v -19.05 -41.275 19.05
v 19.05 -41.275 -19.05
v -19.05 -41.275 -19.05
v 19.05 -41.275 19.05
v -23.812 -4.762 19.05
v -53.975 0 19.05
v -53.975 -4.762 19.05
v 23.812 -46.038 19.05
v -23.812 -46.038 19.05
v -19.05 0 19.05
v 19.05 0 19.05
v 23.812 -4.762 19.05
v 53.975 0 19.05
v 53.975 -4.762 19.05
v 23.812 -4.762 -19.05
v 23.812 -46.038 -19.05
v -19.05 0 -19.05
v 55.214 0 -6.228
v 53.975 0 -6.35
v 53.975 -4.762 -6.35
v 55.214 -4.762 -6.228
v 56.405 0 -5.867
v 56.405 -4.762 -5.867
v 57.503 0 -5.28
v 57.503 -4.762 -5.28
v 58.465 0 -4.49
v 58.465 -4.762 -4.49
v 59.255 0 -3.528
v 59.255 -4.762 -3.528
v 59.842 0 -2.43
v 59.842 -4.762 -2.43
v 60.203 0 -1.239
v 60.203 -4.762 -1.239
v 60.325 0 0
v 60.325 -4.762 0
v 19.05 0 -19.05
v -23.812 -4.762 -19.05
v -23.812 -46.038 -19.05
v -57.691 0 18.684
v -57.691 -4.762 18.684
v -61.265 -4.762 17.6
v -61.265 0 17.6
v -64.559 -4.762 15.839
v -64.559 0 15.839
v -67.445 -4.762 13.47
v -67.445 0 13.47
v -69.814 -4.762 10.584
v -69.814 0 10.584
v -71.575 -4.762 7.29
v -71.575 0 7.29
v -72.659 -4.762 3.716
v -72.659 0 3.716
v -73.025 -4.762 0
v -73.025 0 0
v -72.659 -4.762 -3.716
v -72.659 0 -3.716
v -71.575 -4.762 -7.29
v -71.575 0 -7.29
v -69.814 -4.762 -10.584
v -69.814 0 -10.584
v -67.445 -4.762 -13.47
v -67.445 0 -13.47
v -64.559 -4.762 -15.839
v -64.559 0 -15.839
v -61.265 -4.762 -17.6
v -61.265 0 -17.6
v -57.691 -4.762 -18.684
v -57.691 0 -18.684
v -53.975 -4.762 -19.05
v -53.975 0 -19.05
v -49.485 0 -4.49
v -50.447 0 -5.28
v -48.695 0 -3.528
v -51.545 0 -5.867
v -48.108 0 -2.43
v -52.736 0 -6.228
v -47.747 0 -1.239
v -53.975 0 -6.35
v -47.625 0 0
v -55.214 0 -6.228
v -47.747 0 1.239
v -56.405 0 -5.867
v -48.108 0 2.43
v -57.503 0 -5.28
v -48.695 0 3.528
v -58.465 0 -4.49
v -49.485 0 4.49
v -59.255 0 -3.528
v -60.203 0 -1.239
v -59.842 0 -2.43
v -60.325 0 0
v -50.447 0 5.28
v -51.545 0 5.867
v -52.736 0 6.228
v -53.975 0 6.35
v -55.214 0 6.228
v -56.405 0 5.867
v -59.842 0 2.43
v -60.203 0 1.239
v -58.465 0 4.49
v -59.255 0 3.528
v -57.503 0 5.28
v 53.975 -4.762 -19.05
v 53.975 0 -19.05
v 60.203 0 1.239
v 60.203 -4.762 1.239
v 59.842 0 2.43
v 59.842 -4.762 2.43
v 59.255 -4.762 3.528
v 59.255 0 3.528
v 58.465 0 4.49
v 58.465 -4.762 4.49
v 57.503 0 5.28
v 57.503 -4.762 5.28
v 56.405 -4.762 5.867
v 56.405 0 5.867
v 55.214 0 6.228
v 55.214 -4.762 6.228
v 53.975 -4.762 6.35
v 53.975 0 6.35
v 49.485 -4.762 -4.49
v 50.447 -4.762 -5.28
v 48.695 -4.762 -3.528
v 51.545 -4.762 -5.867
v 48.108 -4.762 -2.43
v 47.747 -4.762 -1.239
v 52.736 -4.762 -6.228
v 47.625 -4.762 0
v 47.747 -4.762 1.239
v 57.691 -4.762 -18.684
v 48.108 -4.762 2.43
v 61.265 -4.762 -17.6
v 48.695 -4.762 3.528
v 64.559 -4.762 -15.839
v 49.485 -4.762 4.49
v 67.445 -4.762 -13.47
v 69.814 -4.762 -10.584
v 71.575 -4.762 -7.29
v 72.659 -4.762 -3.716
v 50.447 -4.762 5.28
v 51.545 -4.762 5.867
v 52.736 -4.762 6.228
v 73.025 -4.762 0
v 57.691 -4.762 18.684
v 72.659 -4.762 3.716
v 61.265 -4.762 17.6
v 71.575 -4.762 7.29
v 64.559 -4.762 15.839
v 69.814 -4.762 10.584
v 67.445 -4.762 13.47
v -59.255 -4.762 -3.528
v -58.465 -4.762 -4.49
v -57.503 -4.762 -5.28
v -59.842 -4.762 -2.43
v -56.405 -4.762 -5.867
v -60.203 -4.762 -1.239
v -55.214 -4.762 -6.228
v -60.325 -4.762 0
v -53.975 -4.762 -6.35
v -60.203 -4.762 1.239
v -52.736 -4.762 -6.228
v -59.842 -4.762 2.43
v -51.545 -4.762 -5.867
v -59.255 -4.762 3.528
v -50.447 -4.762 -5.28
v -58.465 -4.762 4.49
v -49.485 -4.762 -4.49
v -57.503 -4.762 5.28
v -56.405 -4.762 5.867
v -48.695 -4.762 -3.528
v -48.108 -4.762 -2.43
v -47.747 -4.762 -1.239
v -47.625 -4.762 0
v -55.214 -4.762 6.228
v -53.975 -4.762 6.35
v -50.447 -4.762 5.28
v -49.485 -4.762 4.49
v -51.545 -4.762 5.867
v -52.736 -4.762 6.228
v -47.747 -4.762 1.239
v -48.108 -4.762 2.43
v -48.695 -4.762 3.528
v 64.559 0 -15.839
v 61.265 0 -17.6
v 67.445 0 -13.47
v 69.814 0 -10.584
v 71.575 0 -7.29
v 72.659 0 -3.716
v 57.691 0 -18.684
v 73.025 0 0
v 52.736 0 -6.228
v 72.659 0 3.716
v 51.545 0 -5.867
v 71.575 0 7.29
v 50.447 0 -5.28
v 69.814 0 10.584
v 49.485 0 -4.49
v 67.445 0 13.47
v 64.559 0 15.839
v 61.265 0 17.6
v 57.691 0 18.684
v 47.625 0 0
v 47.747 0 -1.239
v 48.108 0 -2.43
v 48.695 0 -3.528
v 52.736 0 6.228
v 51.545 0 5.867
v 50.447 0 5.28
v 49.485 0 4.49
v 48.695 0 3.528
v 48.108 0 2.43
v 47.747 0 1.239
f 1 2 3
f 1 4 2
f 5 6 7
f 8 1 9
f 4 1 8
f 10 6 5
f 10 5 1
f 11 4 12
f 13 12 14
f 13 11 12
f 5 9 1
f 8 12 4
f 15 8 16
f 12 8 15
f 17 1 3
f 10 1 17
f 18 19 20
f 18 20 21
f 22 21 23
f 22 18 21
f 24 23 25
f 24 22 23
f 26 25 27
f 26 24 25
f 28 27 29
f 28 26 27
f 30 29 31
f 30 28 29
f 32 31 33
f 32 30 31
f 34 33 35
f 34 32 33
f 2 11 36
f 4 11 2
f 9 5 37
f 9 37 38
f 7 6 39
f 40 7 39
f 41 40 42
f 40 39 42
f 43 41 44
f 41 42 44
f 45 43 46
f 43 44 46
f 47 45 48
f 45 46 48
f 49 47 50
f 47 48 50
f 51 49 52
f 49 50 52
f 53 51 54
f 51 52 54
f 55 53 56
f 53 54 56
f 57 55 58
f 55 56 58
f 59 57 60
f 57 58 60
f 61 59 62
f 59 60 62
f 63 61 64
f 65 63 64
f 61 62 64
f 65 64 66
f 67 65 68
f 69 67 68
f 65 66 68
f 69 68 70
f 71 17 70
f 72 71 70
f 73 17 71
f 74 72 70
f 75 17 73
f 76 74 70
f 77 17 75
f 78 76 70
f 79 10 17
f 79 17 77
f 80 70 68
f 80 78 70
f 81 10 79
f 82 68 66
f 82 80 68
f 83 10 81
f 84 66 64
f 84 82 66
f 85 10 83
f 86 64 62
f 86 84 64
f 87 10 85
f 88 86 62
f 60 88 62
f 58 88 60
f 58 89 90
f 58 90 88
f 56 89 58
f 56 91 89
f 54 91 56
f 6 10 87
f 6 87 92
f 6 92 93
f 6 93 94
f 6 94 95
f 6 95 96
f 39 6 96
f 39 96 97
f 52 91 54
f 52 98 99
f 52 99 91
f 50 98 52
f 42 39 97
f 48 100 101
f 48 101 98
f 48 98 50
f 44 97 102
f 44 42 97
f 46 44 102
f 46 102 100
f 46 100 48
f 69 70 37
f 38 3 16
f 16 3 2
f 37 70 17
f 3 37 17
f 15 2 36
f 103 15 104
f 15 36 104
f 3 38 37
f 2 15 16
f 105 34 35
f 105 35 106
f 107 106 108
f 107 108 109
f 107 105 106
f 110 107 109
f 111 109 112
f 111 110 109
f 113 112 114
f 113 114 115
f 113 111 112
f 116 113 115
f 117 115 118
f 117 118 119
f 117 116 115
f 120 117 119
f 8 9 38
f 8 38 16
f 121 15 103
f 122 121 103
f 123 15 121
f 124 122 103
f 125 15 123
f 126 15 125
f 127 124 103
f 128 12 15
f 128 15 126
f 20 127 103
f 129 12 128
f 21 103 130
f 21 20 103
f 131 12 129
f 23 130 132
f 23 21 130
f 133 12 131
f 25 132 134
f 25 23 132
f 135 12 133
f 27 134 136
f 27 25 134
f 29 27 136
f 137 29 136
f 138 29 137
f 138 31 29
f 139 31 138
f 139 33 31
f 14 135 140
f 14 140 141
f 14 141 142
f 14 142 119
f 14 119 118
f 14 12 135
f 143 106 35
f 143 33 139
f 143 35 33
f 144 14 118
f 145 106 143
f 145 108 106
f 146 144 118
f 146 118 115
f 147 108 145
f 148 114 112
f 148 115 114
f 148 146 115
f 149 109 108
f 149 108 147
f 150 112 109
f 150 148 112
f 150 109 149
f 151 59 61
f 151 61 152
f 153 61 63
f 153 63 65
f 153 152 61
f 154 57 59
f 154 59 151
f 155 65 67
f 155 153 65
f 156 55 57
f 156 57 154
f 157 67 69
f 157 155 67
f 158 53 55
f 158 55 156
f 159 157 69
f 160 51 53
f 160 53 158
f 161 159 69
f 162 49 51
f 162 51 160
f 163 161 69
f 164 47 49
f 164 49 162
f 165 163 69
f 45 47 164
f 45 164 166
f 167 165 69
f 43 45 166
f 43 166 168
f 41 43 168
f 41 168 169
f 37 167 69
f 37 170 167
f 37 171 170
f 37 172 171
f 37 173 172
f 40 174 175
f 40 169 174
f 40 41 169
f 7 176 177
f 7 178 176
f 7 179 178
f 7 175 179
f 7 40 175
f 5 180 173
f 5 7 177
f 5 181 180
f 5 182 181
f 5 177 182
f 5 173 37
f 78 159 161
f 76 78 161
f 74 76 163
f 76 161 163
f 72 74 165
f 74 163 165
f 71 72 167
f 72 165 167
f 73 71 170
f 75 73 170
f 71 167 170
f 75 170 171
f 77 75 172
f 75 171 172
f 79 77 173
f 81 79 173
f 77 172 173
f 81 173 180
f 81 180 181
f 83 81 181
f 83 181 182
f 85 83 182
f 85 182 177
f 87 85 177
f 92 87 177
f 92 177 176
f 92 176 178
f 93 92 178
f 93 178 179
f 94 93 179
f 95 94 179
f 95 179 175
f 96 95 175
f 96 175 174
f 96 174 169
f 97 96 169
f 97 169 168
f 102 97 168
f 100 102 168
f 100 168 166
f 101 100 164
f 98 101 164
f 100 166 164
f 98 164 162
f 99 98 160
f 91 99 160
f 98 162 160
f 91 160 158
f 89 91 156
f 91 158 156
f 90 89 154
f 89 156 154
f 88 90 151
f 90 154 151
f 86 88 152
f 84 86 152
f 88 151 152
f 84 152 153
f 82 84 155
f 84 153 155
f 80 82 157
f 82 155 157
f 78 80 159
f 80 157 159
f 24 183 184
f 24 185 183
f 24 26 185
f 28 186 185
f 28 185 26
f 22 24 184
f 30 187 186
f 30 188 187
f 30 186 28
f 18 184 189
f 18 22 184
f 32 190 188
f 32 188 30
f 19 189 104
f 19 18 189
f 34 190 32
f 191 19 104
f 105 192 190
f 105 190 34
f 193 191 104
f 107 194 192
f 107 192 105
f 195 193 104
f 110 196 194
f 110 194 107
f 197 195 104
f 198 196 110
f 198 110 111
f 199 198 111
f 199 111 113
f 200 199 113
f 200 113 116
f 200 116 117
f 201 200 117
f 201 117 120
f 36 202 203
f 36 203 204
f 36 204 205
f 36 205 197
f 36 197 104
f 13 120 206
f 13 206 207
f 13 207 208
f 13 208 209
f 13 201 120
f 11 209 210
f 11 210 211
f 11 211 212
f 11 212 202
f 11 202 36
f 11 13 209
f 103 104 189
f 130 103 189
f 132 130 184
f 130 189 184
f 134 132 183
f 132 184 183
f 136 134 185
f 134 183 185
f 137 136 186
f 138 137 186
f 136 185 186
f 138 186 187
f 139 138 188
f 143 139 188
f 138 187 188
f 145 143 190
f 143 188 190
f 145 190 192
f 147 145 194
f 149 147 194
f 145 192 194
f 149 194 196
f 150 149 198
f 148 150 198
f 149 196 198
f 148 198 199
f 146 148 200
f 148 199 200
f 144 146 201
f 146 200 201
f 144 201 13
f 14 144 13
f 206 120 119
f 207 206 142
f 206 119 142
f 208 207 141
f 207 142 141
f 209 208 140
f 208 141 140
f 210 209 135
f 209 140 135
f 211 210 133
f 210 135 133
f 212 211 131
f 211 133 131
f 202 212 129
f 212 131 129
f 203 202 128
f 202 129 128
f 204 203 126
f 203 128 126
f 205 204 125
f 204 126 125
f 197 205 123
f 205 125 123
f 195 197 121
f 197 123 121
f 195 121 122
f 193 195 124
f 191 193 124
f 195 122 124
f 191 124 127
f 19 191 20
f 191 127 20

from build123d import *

# Parameters (mm, degrees)
F1_DEPTH      = 19.05
F1_DEPTH_BACK = 19.05
F3_D          = 12.7
F2_R          = 19.05
F2_R_2        = 6.35
F4_DEPTH      = 4.7625


with BuildPart() as f1:
    # F0 (on Top) → F1 (new body, two sides)
    with BuildSketch(Plane.XY) as f1_sk:
        Polygon((-19.05, -41.275), (-19.05, 0), (-53.975, 0), (-53.975, -4.7625), (-23.8125, -4.7625), (-23.8125, -46.0375), (23.8125, -46.0375), (23.8125, -4.7625), (53.975, -4.7625), (53.975, 0), (19.05, 0), (19.05, -41.275), align=None)
    extrude(amount=F1_DEPTH)
    extrude(f1_sk.sketch, amount=-F1_DEPTH_BACK)

    # F3 (through all)
    with Locations(Plane(origin=(0, 0, 0), x_dir=(1, 0, 0), z_dir=(0, 1, 0))):
        with Locations((-53.975, 0), (53.975, 0)):
            Hole(F3_D / 2)

    # F2 (on Front) → F4 (join)
    with BuildSketch(Plane.XZ):
        with Locations((-53.975, 0)):
            Circle(F2_R)
        with Locations((-53.975, 0)):
            Circle(F2_R_2, mode=Mode.SUBTRACT)
        with Locations((53.975, 0)):
            Circle(F2_R)
        with Locations((53.975, 0)):
            Circle(F2_R_2, mode=Mode.SUBTRACT)
    extrude(amount=F4_DEPTH)


solid = f1.part
